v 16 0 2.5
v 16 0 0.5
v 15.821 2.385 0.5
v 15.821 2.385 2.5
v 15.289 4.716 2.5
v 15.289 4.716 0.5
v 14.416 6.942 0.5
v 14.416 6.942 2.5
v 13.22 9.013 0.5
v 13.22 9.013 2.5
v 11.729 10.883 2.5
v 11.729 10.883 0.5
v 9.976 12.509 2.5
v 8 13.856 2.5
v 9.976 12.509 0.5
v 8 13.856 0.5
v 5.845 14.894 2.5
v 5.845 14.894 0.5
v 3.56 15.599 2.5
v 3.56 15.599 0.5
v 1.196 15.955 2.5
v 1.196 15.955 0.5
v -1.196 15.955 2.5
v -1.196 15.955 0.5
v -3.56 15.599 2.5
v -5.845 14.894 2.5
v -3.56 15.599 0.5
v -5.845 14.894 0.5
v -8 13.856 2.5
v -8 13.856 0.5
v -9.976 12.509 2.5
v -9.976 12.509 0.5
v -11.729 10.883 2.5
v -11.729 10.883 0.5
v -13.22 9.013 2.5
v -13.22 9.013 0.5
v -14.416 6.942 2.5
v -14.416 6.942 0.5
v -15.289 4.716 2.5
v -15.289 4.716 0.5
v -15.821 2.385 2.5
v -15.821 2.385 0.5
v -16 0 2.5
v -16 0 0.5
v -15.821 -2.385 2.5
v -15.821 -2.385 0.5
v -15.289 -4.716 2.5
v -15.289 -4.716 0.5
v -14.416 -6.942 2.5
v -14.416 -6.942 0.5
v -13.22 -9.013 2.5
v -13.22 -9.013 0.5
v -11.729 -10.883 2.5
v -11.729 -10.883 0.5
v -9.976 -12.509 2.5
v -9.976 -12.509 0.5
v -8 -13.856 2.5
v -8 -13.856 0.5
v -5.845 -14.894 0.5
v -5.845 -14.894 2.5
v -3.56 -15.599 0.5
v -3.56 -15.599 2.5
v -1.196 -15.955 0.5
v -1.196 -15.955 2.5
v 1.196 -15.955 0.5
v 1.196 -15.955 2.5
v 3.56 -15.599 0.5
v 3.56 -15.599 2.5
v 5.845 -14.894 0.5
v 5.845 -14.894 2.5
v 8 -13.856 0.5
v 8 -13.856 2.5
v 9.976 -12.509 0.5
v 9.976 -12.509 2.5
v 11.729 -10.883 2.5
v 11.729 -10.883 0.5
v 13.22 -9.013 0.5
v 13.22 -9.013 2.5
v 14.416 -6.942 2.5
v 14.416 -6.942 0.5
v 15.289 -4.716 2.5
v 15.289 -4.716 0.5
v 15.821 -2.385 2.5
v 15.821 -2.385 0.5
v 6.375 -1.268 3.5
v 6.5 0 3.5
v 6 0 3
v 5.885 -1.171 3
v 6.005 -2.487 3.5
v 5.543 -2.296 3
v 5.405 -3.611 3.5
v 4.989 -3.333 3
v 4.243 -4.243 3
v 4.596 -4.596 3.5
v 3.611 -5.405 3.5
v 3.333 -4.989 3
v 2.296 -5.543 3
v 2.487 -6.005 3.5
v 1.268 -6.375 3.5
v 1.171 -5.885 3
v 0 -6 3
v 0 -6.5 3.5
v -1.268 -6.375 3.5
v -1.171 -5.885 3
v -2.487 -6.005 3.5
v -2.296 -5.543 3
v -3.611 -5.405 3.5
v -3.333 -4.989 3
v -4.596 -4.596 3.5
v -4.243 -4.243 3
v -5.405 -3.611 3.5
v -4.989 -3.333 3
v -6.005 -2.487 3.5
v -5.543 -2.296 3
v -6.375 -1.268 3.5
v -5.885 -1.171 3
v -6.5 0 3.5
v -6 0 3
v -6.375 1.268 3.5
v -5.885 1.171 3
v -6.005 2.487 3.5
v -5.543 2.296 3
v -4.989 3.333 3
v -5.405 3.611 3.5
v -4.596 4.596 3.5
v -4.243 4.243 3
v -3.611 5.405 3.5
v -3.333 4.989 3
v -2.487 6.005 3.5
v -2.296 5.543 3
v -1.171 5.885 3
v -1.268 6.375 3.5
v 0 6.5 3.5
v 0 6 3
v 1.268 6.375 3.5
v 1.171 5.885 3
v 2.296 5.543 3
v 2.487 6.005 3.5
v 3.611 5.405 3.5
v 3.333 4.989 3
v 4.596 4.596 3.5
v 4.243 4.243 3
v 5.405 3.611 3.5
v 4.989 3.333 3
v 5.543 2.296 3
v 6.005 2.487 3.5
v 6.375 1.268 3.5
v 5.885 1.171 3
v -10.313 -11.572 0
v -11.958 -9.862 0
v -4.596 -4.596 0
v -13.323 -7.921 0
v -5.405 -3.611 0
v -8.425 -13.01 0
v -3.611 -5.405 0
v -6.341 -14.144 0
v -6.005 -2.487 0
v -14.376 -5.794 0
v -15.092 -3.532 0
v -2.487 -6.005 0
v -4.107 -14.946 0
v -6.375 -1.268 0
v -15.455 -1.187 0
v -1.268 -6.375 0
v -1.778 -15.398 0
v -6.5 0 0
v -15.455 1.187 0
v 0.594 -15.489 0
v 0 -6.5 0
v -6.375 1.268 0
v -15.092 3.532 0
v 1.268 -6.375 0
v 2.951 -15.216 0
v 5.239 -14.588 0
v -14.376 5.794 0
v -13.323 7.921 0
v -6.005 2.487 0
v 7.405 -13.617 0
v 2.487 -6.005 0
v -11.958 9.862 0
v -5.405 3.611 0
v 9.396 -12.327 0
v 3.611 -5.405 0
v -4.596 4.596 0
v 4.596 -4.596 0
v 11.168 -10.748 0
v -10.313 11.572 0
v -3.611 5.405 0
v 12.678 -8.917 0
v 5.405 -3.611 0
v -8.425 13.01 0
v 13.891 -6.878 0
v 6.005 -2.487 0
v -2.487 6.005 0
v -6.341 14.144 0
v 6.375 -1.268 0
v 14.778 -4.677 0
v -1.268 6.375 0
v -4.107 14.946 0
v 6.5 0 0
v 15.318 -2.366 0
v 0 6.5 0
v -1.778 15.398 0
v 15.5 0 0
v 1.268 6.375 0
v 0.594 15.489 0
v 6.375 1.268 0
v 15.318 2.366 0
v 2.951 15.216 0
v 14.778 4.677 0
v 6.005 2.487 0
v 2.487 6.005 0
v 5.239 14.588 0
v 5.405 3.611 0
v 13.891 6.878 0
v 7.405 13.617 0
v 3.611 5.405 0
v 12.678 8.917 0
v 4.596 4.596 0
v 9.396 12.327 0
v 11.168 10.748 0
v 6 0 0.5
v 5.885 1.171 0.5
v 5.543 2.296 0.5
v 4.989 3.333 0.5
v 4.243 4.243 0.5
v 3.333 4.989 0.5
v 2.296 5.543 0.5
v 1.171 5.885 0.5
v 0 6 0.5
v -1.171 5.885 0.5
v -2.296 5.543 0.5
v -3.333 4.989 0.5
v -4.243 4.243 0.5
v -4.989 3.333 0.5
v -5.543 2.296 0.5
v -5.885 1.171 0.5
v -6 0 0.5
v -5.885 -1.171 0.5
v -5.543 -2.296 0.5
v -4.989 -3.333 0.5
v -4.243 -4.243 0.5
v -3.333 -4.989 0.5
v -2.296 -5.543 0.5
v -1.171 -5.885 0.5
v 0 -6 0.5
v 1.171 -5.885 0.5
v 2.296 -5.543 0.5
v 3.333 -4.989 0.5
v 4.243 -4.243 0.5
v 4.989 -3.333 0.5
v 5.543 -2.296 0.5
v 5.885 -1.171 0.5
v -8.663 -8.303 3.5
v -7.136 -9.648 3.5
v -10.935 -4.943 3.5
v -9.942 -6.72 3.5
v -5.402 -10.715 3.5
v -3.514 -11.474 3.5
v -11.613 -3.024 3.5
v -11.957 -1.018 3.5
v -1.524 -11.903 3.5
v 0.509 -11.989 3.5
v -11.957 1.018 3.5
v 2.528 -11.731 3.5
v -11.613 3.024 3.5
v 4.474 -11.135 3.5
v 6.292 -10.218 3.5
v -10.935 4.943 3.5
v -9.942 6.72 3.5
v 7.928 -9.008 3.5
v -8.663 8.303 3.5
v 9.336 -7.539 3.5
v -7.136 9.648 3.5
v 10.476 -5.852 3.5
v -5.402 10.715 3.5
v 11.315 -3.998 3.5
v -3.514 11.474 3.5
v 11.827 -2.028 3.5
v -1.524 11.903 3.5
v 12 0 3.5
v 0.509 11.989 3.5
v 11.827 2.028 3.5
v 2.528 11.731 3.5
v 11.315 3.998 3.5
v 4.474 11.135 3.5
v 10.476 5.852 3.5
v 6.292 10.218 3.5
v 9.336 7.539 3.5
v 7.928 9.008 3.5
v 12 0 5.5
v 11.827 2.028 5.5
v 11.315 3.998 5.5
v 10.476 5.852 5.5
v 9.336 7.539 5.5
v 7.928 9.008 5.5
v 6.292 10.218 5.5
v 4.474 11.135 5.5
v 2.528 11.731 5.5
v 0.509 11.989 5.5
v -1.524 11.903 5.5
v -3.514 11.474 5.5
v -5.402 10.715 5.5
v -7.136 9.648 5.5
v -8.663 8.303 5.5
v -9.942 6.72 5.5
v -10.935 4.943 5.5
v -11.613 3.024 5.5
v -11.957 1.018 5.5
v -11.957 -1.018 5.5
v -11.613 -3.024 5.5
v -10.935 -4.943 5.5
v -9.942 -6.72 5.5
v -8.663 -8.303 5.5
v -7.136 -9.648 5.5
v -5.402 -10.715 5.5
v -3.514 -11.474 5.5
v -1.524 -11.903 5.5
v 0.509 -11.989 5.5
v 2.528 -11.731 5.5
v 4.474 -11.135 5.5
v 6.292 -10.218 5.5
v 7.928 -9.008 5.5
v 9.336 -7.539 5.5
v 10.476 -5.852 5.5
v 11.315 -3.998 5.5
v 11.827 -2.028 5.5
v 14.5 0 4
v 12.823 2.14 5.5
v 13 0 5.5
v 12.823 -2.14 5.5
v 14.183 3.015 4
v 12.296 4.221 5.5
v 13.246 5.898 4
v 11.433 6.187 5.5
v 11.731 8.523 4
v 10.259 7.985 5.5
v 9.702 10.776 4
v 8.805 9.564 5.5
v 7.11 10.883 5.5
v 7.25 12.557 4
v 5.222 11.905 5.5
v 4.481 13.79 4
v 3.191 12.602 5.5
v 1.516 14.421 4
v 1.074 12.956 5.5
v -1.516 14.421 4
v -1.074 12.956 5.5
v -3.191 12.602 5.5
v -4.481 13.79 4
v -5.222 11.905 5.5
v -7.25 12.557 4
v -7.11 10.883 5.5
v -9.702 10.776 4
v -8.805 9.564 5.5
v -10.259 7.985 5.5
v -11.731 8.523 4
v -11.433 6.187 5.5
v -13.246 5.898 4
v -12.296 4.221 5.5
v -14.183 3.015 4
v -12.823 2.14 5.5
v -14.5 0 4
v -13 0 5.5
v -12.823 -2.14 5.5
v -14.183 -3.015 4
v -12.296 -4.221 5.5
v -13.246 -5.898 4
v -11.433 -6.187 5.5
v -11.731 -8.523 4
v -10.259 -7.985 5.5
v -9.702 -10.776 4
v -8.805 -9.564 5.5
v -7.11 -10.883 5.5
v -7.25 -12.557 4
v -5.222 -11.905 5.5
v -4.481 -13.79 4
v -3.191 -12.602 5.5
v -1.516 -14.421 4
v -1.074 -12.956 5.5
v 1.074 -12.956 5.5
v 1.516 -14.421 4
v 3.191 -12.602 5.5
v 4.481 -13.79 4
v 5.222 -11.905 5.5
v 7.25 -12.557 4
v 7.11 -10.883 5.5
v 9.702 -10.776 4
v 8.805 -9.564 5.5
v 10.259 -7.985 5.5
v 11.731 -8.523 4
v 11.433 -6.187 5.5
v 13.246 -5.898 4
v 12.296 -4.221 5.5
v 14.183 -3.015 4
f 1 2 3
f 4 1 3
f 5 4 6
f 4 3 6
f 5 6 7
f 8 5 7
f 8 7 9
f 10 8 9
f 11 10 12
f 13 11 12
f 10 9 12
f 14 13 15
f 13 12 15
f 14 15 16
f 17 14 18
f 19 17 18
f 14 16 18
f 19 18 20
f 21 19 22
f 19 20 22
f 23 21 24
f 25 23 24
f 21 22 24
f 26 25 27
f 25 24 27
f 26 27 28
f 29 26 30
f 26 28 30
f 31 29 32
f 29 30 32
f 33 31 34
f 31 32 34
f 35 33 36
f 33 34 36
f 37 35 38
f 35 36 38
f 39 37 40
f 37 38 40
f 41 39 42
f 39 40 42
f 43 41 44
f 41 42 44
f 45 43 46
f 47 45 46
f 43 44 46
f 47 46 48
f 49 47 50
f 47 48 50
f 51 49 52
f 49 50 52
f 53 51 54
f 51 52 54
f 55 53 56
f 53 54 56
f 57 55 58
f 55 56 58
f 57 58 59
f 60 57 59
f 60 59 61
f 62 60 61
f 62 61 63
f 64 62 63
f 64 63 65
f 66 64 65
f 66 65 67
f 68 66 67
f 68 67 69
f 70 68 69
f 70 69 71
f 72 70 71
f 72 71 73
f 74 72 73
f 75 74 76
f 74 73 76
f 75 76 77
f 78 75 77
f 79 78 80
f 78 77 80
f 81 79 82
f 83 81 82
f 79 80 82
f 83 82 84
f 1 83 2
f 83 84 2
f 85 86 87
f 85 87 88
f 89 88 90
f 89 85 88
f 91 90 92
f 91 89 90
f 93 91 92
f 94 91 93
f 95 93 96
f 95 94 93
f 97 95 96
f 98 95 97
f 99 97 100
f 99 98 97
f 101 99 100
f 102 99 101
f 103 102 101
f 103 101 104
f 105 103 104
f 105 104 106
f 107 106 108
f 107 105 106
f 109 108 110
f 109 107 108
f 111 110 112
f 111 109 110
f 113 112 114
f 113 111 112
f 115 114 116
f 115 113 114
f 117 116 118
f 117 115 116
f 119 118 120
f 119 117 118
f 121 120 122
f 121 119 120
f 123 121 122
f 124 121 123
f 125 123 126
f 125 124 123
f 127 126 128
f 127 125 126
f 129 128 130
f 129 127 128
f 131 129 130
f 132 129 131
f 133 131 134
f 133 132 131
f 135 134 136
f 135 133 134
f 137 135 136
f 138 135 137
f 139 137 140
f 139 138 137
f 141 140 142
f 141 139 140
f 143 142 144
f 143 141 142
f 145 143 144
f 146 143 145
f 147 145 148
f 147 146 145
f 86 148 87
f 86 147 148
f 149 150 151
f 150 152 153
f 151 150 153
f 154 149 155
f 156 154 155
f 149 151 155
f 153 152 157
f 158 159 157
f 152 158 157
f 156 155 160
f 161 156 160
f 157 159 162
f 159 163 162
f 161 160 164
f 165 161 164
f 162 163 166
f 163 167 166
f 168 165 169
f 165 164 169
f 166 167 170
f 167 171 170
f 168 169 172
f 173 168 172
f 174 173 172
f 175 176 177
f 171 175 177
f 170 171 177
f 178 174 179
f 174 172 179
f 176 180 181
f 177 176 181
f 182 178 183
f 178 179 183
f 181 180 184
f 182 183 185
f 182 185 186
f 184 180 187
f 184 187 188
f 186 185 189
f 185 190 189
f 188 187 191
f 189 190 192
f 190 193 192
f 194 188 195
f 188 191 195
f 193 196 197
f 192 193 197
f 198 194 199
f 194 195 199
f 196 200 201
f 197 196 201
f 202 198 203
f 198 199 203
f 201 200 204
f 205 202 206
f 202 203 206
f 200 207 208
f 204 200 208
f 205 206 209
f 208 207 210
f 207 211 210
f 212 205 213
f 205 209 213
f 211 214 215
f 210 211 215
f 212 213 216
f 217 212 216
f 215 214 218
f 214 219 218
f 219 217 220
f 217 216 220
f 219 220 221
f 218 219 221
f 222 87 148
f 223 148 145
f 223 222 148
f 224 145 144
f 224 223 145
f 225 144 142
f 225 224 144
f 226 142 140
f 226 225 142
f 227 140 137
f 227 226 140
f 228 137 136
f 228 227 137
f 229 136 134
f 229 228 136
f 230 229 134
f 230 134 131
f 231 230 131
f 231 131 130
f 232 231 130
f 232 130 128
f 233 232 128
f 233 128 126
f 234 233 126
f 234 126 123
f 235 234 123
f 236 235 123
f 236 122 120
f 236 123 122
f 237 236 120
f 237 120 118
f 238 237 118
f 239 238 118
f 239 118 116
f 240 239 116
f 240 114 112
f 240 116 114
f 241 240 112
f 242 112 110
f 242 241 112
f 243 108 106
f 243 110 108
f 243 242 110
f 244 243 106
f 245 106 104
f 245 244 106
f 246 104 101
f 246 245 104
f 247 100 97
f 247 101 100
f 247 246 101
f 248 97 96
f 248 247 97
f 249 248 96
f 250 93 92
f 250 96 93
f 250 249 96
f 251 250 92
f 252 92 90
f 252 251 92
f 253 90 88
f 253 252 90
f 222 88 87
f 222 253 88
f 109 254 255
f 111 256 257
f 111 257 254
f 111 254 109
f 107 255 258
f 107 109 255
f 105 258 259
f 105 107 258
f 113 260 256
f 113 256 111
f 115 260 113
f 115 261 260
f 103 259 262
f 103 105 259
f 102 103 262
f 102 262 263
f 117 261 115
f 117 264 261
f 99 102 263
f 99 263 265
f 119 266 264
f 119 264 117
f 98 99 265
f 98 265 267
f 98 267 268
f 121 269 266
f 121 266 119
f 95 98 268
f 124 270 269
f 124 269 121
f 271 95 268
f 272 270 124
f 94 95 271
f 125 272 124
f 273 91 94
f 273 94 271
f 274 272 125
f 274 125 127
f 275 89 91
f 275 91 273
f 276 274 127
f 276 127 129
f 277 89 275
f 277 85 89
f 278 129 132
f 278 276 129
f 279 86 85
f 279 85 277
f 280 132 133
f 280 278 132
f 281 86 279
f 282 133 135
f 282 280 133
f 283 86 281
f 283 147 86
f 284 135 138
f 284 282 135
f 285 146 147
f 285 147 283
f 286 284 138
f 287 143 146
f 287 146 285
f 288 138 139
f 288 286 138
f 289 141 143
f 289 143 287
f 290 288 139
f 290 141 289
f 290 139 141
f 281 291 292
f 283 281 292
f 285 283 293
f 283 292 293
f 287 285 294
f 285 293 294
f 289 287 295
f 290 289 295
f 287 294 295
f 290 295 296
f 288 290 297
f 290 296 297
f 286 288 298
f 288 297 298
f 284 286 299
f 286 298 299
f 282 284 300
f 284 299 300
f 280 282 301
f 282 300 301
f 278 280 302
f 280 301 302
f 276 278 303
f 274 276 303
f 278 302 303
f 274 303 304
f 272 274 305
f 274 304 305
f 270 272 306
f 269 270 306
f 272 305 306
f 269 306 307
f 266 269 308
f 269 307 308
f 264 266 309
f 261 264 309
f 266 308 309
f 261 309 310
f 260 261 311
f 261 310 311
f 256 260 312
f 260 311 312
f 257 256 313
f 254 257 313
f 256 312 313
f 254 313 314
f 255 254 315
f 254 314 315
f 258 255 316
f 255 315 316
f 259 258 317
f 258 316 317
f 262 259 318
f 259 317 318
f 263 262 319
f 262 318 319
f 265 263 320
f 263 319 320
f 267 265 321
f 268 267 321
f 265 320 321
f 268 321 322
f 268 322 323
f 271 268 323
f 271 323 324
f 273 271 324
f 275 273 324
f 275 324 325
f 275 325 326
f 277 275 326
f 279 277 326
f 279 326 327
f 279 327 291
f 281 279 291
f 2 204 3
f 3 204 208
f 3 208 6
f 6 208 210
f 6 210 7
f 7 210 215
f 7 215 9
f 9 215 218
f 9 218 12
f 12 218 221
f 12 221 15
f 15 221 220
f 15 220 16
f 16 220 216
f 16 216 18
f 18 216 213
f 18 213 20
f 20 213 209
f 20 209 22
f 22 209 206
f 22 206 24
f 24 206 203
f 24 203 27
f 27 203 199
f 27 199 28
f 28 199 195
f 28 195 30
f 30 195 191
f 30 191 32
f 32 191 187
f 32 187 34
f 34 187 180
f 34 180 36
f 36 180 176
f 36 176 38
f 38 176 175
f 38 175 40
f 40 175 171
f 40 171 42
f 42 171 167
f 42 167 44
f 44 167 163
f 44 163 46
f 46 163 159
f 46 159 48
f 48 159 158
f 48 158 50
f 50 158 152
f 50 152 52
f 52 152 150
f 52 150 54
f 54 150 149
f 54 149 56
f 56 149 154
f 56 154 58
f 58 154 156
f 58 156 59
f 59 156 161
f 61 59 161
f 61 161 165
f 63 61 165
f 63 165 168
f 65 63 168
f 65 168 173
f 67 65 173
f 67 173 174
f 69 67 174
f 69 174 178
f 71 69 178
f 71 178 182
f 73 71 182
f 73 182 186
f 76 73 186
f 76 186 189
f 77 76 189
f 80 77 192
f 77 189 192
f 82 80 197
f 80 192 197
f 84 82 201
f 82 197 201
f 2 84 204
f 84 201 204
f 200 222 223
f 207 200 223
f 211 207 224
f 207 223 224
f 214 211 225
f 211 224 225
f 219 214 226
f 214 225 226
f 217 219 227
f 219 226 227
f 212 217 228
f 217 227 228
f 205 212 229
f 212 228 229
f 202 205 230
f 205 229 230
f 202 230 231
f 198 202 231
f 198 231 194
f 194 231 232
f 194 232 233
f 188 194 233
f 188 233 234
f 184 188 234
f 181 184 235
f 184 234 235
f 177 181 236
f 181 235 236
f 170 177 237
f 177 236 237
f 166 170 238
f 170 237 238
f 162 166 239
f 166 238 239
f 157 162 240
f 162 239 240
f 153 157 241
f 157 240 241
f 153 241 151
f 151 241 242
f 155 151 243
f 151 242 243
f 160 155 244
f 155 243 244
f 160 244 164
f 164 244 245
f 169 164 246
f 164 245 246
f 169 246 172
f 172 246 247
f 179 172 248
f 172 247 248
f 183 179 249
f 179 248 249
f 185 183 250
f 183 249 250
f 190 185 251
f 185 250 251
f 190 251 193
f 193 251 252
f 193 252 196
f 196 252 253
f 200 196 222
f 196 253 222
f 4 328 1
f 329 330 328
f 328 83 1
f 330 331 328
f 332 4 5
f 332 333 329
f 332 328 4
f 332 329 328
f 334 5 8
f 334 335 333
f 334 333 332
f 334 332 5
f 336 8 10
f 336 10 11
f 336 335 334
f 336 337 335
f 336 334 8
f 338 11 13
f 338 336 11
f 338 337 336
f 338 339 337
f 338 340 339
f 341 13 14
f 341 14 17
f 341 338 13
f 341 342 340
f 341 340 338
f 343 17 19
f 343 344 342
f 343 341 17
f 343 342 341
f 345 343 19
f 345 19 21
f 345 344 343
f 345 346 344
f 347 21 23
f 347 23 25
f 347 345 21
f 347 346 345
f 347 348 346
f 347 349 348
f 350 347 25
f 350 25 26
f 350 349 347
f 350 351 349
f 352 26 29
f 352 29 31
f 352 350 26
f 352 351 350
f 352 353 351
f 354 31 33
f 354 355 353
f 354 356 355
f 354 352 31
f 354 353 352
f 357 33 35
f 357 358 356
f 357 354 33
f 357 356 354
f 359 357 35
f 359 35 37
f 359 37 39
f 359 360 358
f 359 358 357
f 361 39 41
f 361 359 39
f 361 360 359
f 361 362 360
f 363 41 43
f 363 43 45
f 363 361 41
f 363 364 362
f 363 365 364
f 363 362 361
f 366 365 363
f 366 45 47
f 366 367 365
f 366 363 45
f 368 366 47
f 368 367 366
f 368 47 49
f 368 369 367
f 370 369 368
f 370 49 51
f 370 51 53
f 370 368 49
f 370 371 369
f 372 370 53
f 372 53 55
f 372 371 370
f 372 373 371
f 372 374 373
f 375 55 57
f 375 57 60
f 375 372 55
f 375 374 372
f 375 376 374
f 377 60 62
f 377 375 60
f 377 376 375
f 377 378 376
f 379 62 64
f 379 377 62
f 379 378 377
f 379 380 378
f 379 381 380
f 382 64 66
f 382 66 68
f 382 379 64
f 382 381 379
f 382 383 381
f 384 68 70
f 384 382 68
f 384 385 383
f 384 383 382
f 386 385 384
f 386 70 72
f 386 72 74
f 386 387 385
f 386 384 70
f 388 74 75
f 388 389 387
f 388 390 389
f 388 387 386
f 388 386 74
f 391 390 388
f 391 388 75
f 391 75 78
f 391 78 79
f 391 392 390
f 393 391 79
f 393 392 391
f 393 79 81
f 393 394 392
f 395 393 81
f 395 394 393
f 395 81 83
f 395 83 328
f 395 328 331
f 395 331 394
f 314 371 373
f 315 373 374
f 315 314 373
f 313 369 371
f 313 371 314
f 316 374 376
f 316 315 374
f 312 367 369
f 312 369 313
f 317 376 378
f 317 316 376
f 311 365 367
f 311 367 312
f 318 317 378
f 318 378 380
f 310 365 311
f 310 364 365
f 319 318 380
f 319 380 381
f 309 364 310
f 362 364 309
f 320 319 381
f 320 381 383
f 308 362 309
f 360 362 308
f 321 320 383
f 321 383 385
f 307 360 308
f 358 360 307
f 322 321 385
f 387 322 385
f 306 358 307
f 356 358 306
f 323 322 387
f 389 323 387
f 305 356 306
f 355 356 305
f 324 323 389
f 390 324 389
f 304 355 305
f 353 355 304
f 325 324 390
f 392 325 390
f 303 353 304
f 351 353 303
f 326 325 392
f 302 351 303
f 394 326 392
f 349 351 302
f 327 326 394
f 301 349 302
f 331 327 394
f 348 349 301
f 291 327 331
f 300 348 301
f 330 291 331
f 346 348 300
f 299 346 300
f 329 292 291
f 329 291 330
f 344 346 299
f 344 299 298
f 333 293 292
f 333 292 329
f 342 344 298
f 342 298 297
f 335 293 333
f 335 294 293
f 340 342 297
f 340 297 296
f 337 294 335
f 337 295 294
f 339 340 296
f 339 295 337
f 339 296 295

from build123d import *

# Parameters (mm, degrees)
F0_R     = 16
F0_R_2   = 6
F1_DEPTH = 5.5
F2_R     = 12
F3_DEPTH = 2
F4_SIZE  = 3
F5_SIZE  = 0.5


with BuildPart() as f1:
    # F0 (on Top) → F1 (new body)
    with BuildSketch(Plane.XY):
        Circle(F0_R)
        Circle(F0_R_2, mode=Mode.SUBTRACT)
    extrude(amount=F1_DEPTH)

    # F2 (on face) → F3 (cut)
    with BuildSketch(Plane.XY.offset(5.5)):
        Circle(F2_R)
    extrude(amount=-F3_DEPTH, mode=Mode.SUBTRACT)

    # F4
    f4_edges = [f1.edges().sort_by_distance(p)[0] for p in [
        (-16, 0, 5.5),
    ]]
    chamfer(f4_edges, length=F4_SIZE)

    # F5
    f5_edges = [f1.edges().sort_by_distance(p)[0] for p in [
        (-16, 0, 0),
        (-6, 0, 0),
        (-6, 0, 3.5),
    ]]
    chamfer(f5_edges, length=F5_SIZE)


solid = f1.part
